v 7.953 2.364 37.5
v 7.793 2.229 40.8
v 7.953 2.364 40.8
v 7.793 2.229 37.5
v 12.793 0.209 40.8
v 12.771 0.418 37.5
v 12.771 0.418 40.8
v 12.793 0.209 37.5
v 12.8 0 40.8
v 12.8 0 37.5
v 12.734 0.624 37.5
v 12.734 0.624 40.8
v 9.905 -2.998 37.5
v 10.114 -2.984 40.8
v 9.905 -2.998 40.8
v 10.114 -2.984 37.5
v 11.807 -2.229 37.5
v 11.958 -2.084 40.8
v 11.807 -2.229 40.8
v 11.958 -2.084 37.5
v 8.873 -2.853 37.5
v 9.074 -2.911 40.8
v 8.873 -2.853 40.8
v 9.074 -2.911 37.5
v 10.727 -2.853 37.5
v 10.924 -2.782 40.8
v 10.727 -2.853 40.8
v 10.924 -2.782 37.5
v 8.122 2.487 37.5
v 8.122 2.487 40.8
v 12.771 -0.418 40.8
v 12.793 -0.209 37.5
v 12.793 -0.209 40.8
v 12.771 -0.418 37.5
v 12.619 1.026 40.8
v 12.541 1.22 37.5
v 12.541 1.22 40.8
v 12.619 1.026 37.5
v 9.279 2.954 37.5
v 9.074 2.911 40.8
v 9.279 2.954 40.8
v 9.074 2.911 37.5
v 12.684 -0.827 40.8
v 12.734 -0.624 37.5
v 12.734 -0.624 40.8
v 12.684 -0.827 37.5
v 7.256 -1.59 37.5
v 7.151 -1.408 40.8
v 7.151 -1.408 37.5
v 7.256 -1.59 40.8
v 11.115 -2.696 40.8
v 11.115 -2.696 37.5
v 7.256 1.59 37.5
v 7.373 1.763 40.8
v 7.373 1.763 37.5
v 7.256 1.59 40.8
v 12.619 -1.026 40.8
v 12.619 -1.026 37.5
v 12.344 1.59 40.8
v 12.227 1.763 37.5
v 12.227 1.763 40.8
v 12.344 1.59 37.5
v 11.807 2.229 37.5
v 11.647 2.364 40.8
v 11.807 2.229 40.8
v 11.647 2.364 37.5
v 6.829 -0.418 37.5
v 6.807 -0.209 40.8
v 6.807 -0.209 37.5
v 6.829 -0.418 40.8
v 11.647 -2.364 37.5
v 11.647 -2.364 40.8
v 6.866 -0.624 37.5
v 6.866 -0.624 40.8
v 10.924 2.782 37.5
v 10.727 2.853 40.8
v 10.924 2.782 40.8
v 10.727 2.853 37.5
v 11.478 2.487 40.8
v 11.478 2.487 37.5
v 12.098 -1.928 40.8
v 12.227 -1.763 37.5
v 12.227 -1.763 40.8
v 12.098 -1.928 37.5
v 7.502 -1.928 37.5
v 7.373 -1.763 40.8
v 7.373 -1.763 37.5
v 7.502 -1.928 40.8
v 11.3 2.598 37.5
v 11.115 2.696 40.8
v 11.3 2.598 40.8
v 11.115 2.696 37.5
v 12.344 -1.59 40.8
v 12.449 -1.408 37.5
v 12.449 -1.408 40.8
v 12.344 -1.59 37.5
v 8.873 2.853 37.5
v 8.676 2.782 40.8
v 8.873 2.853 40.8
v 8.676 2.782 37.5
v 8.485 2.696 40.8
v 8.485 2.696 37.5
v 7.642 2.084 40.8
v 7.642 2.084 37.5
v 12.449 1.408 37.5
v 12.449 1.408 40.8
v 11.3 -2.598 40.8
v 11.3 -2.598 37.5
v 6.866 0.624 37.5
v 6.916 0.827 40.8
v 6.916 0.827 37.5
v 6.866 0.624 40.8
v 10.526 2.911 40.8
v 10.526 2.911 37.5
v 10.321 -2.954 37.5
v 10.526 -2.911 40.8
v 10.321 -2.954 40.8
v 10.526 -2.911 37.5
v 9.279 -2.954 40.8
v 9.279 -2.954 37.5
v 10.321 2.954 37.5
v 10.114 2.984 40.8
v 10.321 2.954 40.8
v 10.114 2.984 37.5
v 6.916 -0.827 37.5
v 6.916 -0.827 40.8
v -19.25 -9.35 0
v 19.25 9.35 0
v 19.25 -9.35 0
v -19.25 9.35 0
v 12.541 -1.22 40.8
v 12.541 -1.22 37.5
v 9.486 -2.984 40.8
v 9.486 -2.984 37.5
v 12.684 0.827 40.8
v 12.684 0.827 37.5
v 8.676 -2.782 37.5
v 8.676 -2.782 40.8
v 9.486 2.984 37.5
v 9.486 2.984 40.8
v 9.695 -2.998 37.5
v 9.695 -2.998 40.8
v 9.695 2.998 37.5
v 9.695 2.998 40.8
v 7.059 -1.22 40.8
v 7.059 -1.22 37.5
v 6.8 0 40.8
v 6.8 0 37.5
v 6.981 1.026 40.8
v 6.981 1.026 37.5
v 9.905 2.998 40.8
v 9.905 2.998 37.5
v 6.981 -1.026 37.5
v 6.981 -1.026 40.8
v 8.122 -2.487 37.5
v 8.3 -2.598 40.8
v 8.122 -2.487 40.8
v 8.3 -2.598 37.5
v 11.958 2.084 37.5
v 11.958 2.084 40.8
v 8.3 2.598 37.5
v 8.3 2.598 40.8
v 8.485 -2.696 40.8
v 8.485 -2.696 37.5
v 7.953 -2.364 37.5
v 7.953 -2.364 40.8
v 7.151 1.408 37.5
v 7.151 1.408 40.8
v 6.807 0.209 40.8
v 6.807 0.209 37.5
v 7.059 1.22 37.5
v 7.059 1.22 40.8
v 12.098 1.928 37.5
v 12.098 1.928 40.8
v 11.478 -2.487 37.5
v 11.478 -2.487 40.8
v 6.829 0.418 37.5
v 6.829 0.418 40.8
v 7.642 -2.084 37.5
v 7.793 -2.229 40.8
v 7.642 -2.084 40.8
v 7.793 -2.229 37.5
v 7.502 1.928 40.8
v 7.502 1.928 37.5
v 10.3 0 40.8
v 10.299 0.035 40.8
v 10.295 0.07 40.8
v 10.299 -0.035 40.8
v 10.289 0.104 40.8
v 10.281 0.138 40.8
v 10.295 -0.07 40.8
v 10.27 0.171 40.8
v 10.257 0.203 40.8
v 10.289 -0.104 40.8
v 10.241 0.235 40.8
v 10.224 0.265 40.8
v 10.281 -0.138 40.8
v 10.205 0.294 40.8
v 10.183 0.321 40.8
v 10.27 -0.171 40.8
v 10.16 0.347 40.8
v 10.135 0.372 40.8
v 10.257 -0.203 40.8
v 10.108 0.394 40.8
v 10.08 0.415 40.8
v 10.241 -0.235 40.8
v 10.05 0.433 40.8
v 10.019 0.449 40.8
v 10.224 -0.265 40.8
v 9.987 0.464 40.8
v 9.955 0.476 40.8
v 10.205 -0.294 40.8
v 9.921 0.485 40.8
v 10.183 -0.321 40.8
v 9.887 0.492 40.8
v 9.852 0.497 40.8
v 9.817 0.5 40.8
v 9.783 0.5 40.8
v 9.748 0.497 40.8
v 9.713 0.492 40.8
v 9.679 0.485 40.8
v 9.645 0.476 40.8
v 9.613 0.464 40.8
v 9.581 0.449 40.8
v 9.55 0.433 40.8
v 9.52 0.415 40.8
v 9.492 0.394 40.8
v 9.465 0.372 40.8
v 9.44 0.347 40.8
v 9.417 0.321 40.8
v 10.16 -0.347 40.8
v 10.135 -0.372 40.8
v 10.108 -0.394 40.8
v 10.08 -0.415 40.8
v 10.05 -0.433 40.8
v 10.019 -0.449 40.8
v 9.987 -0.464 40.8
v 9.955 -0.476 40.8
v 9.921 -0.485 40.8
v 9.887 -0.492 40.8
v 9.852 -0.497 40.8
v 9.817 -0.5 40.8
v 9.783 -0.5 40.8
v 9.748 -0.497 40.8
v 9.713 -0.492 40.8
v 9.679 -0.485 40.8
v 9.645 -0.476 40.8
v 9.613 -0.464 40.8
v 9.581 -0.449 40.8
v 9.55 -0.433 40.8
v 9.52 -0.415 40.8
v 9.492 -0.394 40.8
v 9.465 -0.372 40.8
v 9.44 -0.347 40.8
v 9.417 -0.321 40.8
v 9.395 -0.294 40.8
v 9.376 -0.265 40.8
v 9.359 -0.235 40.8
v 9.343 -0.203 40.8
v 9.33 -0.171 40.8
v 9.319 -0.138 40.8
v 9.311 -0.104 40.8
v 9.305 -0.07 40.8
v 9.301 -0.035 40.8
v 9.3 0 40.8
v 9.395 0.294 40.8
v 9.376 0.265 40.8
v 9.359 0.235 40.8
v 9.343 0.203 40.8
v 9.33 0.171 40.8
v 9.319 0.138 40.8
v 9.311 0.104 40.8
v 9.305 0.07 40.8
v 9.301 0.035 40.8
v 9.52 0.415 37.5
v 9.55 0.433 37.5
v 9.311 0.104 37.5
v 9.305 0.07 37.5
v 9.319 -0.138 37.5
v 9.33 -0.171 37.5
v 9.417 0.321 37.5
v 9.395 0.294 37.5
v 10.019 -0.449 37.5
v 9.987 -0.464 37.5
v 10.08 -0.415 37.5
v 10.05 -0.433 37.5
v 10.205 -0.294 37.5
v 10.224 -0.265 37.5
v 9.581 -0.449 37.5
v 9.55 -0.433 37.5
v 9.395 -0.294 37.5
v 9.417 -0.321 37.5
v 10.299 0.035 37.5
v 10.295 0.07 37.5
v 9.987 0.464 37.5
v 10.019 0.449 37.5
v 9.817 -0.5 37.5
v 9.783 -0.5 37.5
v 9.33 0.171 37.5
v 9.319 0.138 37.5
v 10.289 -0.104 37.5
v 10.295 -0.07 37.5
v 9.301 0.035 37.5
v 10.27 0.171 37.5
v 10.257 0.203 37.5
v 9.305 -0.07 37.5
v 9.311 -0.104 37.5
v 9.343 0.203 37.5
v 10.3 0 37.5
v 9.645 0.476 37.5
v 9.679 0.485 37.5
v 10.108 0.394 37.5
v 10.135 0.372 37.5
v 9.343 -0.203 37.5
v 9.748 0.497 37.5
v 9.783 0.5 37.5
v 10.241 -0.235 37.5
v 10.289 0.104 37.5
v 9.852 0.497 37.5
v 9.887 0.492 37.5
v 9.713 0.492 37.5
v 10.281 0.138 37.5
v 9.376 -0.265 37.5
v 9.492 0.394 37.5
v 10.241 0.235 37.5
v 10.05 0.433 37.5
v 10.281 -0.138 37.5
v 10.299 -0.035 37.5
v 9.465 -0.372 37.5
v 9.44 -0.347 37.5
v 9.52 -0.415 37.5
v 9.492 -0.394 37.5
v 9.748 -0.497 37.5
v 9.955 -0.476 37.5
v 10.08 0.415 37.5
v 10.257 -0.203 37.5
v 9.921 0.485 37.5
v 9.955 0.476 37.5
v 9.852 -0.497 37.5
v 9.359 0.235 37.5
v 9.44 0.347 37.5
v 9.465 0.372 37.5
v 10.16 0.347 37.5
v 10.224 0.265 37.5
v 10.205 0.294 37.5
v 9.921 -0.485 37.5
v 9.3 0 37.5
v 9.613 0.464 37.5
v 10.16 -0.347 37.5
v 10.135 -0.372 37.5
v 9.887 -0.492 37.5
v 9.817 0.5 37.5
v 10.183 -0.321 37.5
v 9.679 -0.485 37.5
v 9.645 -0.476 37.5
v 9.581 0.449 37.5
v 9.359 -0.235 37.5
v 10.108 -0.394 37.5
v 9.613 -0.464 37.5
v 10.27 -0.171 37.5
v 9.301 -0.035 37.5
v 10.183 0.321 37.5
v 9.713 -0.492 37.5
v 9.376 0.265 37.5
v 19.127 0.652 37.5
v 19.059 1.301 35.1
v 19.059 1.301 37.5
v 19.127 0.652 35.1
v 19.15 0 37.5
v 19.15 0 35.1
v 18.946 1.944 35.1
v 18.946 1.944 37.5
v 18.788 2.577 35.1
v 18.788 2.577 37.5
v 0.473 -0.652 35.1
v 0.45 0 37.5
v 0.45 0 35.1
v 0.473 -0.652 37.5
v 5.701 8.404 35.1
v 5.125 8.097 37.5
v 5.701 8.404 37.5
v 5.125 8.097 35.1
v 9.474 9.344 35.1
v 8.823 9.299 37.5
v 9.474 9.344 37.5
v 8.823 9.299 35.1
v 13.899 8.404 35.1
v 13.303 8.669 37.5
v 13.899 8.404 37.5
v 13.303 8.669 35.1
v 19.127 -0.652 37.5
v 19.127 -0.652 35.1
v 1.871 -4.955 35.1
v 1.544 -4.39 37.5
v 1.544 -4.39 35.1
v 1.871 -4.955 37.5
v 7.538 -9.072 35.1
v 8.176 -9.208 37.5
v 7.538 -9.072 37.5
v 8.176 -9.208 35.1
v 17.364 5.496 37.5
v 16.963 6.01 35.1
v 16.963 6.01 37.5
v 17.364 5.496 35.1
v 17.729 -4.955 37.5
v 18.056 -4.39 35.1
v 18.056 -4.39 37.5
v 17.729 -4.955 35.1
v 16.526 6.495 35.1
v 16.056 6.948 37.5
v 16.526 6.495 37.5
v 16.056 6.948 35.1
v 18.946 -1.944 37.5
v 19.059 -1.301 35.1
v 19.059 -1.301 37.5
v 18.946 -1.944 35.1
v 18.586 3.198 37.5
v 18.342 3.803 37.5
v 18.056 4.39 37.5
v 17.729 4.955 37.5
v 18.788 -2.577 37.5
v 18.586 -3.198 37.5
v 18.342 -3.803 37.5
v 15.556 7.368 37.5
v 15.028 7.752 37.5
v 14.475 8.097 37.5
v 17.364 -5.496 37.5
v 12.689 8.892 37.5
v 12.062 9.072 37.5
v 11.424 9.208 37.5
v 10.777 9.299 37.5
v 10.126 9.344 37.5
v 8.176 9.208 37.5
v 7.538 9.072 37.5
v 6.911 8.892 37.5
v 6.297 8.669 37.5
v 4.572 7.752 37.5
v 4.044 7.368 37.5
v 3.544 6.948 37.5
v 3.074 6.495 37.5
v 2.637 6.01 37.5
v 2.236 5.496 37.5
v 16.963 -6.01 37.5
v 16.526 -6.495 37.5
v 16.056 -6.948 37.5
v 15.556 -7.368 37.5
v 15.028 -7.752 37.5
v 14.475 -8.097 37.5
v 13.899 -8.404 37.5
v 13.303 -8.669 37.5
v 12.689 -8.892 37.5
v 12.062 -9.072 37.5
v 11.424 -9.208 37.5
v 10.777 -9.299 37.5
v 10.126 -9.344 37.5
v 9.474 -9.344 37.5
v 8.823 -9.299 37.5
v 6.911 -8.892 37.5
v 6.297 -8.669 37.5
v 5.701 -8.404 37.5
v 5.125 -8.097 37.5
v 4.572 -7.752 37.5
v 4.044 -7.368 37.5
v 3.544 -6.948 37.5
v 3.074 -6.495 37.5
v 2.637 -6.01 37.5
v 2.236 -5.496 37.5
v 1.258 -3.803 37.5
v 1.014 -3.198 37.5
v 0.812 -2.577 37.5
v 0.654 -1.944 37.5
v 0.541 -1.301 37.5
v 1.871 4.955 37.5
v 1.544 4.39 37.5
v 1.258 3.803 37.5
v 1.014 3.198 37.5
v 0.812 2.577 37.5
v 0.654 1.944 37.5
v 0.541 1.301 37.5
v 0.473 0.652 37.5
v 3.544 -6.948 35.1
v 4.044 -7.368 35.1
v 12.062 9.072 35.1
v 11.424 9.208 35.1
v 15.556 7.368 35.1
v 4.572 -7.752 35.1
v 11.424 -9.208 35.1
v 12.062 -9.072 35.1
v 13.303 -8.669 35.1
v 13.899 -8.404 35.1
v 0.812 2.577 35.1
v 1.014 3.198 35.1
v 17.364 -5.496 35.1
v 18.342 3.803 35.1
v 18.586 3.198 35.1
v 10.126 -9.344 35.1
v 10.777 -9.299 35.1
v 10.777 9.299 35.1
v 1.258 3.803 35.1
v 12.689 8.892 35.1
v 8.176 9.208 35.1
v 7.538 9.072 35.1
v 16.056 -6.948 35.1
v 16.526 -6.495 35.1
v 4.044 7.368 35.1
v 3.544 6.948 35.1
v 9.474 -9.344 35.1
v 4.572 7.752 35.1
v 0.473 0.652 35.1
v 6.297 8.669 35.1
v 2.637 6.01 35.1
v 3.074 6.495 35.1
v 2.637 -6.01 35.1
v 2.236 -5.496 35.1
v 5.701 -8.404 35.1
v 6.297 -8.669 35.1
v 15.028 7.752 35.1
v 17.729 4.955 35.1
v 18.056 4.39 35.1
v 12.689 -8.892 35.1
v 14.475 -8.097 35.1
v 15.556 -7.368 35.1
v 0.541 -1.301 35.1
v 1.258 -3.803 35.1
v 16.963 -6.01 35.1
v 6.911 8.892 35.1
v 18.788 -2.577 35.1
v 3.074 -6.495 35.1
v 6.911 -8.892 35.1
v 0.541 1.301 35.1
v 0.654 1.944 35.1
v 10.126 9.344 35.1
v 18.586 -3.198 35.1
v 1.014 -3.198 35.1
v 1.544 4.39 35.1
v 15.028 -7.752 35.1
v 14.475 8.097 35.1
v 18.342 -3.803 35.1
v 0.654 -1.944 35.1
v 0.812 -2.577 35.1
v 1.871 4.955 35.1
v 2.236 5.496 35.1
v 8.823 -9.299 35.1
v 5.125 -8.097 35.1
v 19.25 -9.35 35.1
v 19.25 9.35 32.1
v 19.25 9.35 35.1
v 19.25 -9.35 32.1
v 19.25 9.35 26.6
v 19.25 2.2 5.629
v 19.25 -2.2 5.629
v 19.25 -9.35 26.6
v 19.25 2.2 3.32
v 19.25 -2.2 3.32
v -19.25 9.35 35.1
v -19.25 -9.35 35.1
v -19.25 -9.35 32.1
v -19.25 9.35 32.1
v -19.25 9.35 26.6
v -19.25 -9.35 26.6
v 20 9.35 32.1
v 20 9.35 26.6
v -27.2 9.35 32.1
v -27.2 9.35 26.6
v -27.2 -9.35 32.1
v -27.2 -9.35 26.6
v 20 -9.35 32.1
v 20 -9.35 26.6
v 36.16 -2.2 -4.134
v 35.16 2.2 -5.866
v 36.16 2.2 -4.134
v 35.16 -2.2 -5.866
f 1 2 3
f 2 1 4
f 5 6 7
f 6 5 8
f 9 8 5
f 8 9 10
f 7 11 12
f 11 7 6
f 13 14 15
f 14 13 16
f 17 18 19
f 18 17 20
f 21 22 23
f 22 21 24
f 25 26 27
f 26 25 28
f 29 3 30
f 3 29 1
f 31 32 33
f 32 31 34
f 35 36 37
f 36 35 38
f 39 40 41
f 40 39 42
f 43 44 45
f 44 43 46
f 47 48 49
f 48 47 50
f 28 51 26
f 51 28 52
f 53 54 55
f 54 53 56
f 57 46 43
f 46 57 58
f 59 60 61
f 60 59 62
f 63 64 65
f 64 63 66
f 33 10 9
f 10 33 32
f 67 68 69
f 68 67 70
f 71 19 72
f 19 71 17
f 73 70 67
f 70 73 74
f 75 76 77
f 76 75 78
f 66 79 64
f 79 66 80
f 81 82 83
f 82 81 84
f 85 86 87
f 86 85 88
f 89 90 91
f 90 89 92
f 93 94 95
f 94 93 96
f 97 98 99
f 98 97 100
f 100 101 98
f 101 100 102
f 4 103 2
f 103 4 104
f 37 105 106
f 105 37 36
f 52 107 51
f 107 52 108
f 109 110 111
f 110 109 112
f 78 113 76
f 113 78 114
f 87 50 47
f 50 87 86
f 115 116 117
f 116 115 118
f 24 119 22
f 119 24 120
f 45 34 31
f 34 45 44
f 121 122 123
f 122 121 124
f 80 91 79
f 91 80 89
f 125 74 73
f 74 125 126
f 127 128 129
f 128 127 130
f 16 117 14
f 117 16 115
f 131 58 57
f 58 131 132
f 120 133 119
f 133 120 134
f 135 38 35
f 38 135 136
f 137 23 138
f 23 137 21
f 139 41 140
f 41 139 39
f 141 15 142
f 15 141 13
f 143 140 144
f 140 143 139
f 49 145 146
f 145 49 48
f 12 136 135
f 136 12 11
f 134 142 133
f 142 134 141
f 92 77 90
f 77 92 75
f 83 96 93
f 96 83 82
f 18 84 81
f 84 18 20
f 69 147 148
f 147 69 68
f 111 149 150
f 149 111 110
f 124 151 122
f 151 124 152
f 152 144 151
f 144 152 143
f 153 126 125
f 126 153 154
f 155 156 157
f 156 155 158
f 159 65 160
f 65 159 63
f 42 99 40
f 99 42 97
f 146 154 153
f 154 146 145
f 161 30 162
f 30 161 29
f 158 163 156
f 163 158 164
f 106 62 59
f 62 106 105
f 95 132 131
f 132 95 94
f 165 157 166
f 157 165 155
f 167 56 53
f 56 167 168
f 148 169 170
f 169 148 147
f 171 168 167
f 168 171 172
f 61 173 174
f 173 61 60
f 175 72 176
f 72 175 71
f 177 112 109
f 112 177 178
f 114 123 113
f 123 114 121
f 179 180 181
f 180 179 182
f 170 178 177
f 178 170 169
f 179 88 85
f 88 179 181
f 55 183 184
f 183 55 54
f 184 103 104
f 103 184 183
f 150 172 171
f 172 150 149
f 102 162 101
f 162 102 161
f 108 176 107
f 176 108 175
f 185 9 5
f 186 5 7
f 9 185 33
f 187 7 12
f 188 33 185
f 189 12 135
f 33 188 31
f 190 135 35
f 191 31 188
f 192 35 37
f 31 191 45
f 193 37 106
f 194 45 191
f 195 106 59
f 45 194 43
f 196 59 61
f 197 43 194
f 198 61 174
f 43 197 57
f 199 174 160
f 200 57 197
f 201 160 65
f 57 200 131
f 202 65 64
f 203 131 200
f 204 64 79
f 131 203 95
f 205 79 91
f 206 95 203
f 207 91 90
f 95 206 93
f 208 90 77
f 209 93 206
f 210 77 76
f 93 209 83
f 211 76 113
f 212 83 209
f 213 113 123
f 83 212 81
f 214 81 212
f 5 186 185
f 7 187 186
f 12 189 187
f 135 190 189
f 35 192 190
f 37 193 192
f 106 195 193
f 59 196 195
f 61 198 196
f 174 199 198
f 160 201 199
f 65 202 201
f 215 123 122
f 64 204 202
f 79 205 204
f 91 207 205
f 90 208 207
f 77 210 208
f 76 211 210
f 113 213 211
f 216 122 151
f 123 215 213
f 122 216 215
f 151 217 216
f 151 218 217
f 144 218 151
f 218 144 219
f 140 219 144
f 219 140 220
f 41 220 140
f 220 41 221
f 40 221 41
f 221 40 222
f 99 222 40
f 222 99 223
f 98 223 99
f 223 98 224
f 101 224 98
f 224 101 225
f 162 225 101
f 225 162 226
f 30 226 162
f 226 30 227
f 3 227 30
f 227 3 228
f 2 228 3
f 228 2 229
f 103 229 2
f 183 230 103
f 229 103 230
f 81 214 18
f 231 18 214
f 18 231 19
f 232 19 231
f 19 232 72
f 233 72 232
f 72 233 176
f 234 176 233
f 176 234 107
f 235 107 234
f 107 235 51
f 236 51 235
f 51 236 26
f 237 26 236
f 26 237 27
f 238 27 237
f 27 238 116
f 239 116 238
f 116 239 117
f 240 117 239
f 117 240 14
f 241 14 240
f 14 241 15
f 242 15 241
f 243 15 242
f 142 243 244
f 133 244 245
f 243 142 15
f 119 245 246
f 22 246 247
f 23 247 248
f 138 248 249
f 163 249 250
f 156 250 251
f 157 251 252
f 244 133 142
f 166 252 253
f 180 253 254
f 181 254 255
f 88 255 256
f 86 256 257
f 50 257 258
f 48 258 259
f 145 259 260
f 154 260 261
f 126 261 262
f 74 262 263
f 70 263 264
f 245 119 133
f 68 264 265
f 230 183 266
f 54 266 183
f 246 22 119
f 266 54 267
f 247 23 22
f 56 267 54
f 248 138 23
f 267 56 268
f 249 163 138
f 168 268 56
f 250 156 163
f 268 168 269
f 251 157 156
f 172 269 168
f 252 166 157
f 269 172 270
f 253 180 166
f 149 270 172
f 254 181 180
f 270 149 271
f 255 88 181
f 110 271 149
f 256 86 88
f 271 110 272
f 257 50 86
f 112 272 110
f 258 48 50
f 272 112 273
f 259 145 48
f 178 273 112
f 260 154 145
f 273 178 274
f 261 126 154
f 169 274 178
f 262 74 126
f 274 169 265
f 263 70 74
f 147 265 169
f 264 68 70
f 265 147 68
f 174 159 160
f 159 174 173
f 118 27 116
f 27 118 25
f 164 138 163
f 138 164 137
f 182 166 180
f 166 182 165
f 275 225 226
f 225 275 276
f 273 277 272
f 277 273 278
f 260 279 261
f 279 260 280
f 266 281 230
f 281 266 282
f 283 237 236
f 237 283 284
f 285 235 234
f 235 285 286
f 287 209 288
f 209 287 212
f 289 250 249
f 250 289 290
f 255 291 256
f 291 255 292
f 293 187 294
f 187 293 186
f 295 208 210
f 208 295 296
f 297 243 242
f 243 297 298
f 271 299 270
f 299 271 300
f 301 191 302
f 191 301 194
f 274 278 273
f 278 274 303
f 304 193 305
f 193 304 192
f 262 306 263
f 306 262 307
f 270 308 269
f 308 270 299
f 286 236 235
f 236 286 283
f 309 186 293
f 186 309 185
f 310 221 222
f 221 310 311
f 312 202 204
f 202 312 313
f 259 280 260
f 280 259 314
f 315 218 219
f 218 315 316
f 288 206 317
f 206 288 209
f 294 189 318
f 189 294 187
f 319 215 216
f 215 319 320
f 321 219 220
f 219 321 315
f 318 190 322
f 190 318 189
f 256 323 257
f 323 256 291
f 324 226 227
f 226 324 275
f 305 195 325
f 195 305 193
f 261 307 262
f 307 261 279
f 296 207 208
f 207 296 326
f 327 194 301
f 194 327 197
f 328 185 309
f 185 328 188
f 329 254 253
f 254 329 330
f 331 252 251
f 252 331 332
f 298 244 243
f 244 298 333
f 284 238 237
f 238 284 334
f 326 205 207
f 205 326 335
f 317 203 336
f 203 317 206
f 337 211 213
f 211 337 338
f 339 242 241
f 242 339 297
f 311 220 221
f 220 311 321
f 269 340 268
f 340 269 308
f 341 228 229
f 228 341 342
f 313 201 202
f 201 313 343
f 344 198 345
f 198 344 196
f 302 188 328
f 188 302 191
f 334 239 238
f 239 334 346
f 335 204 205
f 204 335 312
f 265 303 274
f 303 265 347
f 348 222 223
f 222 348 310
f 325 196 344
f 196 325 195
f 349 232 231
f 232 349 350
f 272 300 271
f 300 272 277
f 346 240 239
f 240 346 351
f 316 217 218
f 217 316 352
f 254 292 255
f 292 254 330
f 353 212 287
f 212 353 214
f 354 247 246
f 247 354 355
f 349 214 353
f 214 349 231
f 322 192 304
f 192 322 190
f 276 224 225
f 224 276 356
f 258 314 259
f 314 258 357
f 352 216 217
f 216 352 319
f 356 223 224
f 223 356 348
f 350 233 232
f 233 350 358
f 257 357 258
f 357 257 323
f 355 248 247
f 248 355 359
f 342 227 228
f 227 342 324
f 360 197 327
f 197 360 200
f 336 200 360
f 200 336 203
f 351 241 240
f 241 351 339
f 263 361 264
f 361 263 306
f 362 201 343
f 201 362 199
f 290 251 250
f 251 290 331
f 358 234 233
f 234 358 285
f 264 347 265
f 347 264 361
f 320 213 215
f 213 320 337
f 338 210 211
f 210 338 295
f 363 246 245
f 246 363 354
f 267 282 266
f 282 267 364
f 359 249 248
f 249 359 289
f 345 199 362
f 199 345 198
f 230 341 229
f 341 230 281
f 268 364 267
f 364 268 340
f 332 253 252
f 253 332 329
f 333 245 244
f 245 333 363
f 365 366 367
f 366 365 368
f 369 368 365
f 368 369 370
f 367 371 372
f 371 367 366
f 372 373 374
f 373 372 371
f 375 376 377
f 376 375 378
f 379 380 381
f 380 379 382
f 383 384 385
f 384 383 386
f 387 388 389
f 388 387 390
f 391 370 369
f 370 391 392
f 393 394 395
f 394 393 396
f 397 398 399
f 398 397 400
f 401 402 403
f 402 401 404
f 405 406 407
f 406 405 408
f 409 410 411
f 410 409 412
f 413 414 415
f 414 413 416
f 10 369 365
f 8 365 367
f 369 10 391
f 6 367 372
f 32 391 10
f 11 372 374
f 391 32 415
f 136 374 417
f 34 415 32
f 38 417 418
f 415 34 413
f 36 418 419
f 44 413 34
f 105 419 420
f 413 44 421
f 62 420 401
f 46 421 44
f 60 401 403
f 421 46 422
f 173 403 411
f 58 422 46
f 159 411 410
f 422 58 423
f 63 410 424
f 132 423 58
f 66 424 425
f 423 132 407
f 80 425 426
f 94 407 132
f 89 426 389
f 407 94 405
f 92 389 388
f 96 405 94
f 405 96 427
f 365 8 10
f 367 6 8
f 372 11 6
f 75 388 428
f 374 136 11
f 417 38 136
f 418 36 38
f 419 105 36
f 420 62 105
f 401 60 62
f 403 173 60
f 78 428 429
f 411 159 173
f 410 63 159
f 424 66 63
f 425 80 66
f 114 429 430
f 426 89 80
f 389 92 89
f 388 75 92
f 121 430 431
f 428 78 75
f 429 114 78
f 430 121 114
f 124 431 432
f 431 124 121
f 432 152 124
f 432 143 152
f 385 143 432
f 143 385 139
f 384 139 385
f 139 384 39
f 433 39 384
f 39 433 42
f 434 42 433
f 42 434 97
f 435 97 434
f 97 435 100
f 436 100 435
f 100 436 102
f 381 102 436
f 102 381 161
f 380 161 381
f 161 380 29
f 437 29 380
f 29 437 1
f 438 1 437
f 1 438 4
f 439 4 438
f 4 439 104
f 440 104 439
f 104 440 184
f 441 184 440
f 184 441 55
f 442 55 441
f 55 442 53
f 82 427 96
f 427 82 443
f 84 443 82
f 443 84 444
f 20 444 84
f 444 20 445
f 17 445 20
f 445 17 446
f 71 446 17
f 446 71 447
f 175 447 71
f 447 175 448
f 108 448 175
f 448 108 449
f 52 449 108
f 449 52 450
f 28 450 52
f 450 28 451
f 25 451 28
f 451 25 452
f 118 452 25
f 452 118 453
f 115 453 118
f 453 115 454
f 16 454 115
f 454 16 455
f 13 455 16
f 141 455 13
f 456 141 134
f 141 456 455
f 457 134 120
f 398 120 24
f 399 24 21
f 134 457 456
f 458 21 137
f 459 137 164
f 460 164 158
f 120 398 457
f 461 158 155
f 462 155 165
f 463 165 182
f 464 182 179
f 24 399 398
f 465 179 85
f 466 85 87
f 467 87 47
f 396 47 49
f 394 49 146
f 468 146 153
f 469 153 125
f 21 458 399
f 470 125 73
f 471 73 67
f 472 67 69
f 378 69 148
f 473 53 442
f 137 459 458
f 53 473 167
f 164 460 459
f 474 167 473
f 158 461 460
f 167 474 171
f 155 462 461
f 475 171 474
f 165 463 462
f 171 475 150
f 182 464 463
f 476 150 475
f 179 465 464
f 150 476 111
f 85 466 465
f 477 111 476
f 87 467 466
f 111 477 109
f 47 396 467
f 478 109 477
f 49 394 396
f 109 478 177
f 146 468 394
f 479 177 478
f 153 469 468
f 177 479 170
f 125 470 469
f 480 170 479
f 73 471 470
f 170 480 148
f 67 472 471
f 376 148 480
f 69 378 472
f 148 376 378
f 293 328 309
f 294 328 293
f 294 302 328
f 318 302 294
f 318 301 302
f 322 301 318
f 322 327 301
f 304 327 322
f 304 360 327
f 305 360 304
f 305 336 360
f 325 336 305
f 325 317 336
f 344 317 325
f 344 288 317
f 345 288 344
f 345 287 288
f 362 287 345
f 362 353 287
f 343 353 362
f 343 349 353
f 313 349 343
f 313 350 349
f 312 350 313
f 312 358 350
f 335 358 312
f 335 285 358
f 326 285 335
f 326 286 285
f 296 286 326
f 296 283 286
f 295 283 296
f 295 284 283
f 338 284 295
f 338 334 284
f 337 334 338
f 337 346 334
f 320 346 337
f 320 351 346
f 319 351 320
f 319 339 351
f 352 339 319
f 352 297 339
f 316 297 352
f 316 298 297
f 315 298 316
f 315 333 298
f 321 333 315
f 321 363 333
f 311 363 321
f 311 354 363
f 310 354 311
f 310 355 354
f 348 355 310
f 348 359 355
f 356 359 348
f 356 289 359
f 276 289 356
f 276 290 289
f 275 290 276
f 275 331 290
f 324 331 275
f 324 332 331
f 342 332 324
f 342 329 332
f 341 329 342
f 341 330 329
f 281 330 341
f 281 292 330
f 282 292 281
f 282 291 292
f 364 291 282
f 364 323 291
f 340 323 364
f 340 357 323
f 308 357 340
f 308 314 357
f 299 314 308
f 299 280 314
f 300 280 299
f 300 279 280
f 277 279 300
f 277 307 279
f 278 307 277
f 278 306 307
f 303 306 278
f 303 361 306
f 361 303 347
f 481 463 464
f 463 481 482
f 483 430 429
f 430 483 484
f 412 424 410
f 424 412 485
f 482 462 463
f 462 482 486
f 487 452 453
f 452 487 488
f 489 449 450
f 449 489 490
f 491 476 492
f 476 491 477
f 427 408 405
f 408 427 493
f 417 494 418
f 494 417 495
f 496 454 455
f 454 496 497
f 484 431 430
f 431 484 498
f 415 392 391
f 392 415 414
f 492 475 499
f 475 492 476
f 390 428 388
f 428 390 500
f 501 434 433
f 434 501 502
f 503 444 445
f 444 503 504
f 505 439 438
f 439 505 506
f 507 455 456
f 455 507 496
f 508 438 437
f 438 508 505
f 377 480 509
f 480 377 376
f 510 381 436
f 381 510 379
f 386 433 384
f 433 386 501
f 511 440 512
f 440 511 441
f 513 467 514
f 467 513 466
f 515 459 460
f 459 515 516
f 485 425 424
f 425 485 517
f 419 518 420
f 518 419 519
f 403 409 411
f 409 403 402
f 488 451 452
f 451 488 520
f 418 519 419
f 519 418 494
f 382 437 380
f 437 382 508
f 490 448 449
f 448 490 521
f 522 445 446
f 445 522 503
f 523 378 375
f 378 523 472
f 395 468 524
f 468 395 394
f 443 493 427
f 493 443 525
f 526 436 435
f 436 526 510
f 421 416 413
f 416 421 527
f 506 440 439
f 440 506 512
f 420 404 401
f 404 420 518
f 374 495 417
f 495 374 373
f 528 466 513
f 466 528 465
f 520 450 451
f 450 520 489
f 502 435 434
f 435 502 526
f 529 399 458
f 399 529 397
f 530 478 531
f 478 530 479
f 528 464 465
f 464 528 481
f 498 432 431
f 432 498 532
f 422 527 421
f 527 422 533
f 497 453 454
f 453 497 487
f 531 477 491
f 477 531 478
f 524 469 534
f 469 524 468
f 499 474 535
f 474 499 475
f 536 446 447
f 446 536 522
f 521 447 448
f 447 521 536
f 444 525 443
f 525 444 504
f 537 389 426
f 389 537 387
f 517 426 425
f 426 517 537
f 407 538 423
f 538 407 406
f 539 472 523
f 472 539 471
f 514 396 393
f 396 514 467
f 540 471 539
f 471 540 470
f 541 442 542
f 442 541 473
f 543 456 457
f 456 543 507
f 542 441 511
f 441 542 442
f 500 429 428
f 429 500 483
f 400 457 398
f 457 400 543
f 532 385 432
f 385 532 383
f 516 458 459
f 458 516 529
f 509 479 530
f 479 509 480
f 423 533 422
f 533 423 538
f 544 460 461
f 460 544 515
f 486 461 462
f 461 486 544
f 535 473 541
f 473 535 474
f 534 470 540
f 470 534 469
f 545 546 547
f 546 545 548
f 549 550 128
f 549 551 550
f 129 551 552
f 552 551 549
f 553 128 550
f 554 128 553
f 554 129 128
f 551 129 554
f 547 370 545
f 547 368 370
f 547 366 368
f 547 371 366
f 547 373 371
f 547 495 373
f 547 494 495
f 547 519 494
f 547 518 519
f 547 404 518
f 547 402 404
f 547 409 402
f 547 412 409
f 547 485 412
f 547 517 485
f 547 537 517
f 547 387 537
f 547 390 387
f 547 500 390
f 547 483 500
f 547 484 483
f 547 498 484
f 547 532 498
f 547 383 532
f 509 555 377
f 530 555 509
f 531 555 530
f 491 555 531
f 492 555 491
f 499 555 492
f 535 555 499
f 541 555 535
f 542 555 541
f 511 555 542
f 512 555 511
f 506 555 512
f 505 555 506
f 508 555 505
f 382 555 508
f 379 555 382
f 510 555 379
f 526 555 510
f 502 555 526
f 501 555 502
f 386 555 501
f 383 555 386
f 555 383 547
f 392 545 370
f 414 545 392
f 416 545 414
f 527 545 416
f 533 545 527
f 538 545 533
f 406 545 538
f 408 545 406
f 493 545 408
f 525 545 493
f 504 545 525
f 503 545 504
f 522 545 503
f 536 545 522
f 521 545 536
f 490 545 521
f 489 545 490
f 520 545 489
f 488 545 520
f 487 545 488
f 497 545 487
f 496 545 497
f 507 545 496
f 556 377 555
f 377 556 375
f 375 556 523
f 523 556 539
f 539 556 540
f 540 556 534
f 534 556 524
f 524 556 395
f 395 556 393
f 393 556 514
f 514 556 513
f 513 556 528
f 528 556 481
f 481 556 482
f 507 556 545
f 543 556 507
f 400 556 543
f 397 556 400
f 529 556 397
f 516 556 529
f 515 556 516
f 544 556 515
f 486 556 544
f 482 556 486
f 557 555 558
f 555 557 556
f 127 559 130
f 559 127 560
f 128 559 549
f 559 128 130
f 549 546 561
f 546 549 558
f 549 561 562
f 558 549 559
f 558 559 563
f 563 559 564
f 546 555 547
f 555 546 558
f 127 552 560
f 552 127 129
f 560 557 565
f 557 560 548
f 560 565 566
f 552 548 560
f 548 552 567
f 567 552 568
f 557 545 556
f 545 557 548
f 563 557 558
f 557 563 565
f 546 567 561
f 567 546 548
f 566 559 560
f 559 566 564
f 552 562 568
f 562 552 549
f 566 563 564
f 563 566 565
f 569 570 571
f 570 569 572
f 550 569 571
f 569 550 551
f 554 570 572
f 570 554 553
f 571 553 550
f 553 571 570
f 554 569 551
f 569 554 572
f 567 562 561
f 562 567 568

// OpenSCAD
// file: servo.scad
$fn = 90;

servo();

module servo(color = "#81a2be"){
	color(color){
		width = 18.7;
		
		mainBlock(width);
		axis(width);
		mounting(width);
		wire();
	}
	
	module mainBlock(width){
		length = 38.5;
		height = 35.1;
		translate([-length/2, -width/2, 0])
			cube([length, width, height]);
	}
	
	module axis(width){
		translate([9.8, 0, 0]){
			cylinder(d=width, h=37.5);
			difference(){
				cylinder(d=6, h=40.8);
				#cylinder(d=1, h=50);
			}
		}
	}
	
	module mounting(width){
		length = 54.4;
		translate([-length/2, -width/2, 26.6])
			cube([54.4, width, 5.5]);
	}
	
	
	module wire(){
		translate([27, 0, 0])
			rotate([0, 30, 0])
				cube([20, 4.4, 2], center=true);
	}
}
// main file
use <servo.scad>

servo_modified();

module servo_modified(color){
	difference(){
		servo(color);
		translate([25, 0, 30])
			cube([10, 30, 10], center=true);
	}
}
